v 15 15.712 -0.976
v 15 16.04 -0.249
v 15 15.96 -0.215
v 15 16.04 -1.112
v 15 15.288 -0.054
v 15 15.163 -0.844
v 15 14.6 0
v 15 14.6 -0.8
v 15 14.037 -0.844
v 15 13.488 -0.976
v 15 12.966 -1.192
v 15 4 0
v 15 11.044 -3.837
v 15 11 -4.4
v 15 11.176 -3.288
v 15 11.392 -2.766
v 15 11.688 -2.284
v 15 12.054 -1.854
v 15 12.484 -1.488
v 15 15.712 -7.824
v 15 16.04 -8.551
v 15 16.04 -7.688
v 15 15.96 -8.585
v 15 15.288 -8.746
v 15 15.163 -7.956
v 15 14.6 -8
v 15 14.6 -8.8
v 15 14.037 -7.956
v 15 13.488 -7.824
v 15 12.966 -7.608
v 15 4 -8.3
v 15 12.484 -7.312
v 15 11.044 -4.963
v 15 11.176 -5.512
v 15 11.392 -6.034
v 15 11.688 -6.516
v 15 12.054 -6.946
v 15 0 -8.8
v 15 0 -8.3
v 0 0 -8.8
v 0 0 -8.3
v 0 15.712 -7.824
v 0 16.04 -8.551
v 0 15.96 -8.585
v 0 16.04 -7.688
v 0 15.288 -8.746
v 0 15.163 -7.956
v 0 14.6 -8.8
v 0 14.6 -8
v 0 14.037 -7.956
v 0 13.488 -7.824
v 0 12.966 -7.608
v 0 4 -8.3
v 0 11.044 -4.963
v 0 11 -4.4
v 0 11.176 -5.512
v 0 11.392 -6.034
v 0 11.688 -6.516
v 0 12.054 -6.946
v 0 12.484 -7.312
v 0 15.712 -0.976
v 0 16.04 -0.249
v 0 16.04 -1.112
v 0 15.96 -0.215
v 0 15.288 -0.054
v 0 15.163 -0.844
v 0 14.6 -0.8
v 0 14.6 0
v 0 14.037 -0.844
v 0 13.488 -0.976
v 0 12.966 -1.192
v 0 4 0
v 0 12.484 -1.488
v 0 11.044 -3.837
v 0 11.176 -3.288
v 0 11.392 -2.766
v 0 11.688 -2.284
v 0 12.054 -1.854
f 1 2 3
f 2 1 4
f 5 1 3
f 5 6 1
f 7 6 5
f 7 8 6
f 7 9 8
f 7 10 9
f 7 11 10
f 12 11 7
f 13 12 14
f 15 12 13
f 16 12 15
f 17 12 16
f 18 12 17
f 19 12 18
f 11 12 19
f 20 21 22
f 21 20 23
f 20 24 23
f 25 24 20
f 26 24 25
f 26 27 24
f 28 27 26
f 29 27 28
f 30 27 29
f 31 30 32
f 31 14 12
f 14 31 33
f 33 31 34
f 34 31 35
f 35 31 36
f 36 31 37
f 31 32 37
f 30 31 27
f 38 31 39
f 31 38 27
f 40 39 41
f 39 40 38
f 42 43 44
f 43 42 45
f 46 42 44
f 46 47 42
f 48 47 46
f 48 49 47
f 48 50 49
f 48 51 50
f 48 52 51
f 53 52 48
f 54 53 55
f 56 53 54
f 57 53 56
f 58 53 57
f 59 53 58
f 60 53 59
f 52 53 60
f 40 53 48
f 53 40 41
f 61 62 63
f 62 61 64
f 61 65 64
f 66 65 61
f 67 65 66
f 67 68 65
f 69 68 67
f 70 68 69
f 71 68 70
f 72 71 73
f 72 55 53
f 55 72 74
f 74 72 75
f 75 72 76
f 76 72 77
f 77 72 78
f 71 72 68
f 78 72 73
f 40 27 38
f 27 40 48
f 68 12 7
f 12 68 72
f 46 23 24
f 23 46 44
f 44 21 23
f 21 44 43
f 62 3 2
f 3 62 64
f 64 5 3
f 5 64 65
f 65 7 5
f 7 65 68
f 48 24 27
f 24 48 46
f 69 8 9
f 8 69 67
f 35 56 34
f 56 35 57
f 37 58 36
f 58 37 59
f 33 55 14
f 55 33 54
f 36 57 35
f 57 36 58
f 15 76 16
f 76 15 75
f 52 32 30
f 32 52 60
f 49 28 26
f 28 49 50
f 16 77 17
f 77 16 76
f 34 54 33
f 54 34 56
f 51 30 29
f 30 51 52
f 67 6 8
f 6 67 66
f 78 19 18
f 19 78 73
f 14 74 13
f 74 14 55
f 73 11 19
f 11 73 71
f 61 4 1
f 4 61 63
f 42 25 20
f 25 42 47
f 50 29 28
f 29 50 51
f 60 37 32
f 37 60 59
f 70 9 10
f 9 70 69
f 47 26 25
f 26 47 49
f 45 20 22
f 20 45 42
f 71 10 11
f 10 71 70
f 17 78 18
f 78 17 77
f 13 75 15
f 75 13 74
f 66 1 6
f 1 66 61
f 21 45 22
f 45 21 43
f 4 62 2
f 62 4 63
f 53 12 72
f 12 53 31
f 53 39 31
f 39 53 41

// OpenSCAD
/*                ____
   ###           /#  #
   ###===========##  #      --  
                 \#  #      h
                  ''''      --
                            l
        |breite|            --
*/

r = 3.6;  // radius of the key
h = 7;
l = 4;
breite = 15;   // width
spalt  = 0.5; // thickness of the frame holder
dicke  = 0.8; // thickness of the key holder

// printing variants
rotate(a=[-90,0,0])   
//rotate(a=[180,0,0])
difference() {
    union() {
      cube([breite, 2*(r+dicke), l+h+r]);
      // key holder
      translate([breite/2, r+dicke, l+h+r]) {
          rotate(a=[0,90,0]) { 
            cylinder(breite, r+dicke, r+dicke, center=true, $fn=40); 
          }
      } 
    }
    // Hole in key holder
    translate([breite/2, r+dicke, l+h+r]) {
        rotate(a=[0,90,0]) { 
            cylinder(breite, r, r, center=true, $fn=40); 
        }
    }
    // Cut of from key holder
    translate([0,0,l+h+r+(1.2*r/3)]) cube([breite, 2*(r+dicke), r]);
    // cut for the frame holder
    cube([breite, 2*(r+dicke) - spalt, l]);
}
